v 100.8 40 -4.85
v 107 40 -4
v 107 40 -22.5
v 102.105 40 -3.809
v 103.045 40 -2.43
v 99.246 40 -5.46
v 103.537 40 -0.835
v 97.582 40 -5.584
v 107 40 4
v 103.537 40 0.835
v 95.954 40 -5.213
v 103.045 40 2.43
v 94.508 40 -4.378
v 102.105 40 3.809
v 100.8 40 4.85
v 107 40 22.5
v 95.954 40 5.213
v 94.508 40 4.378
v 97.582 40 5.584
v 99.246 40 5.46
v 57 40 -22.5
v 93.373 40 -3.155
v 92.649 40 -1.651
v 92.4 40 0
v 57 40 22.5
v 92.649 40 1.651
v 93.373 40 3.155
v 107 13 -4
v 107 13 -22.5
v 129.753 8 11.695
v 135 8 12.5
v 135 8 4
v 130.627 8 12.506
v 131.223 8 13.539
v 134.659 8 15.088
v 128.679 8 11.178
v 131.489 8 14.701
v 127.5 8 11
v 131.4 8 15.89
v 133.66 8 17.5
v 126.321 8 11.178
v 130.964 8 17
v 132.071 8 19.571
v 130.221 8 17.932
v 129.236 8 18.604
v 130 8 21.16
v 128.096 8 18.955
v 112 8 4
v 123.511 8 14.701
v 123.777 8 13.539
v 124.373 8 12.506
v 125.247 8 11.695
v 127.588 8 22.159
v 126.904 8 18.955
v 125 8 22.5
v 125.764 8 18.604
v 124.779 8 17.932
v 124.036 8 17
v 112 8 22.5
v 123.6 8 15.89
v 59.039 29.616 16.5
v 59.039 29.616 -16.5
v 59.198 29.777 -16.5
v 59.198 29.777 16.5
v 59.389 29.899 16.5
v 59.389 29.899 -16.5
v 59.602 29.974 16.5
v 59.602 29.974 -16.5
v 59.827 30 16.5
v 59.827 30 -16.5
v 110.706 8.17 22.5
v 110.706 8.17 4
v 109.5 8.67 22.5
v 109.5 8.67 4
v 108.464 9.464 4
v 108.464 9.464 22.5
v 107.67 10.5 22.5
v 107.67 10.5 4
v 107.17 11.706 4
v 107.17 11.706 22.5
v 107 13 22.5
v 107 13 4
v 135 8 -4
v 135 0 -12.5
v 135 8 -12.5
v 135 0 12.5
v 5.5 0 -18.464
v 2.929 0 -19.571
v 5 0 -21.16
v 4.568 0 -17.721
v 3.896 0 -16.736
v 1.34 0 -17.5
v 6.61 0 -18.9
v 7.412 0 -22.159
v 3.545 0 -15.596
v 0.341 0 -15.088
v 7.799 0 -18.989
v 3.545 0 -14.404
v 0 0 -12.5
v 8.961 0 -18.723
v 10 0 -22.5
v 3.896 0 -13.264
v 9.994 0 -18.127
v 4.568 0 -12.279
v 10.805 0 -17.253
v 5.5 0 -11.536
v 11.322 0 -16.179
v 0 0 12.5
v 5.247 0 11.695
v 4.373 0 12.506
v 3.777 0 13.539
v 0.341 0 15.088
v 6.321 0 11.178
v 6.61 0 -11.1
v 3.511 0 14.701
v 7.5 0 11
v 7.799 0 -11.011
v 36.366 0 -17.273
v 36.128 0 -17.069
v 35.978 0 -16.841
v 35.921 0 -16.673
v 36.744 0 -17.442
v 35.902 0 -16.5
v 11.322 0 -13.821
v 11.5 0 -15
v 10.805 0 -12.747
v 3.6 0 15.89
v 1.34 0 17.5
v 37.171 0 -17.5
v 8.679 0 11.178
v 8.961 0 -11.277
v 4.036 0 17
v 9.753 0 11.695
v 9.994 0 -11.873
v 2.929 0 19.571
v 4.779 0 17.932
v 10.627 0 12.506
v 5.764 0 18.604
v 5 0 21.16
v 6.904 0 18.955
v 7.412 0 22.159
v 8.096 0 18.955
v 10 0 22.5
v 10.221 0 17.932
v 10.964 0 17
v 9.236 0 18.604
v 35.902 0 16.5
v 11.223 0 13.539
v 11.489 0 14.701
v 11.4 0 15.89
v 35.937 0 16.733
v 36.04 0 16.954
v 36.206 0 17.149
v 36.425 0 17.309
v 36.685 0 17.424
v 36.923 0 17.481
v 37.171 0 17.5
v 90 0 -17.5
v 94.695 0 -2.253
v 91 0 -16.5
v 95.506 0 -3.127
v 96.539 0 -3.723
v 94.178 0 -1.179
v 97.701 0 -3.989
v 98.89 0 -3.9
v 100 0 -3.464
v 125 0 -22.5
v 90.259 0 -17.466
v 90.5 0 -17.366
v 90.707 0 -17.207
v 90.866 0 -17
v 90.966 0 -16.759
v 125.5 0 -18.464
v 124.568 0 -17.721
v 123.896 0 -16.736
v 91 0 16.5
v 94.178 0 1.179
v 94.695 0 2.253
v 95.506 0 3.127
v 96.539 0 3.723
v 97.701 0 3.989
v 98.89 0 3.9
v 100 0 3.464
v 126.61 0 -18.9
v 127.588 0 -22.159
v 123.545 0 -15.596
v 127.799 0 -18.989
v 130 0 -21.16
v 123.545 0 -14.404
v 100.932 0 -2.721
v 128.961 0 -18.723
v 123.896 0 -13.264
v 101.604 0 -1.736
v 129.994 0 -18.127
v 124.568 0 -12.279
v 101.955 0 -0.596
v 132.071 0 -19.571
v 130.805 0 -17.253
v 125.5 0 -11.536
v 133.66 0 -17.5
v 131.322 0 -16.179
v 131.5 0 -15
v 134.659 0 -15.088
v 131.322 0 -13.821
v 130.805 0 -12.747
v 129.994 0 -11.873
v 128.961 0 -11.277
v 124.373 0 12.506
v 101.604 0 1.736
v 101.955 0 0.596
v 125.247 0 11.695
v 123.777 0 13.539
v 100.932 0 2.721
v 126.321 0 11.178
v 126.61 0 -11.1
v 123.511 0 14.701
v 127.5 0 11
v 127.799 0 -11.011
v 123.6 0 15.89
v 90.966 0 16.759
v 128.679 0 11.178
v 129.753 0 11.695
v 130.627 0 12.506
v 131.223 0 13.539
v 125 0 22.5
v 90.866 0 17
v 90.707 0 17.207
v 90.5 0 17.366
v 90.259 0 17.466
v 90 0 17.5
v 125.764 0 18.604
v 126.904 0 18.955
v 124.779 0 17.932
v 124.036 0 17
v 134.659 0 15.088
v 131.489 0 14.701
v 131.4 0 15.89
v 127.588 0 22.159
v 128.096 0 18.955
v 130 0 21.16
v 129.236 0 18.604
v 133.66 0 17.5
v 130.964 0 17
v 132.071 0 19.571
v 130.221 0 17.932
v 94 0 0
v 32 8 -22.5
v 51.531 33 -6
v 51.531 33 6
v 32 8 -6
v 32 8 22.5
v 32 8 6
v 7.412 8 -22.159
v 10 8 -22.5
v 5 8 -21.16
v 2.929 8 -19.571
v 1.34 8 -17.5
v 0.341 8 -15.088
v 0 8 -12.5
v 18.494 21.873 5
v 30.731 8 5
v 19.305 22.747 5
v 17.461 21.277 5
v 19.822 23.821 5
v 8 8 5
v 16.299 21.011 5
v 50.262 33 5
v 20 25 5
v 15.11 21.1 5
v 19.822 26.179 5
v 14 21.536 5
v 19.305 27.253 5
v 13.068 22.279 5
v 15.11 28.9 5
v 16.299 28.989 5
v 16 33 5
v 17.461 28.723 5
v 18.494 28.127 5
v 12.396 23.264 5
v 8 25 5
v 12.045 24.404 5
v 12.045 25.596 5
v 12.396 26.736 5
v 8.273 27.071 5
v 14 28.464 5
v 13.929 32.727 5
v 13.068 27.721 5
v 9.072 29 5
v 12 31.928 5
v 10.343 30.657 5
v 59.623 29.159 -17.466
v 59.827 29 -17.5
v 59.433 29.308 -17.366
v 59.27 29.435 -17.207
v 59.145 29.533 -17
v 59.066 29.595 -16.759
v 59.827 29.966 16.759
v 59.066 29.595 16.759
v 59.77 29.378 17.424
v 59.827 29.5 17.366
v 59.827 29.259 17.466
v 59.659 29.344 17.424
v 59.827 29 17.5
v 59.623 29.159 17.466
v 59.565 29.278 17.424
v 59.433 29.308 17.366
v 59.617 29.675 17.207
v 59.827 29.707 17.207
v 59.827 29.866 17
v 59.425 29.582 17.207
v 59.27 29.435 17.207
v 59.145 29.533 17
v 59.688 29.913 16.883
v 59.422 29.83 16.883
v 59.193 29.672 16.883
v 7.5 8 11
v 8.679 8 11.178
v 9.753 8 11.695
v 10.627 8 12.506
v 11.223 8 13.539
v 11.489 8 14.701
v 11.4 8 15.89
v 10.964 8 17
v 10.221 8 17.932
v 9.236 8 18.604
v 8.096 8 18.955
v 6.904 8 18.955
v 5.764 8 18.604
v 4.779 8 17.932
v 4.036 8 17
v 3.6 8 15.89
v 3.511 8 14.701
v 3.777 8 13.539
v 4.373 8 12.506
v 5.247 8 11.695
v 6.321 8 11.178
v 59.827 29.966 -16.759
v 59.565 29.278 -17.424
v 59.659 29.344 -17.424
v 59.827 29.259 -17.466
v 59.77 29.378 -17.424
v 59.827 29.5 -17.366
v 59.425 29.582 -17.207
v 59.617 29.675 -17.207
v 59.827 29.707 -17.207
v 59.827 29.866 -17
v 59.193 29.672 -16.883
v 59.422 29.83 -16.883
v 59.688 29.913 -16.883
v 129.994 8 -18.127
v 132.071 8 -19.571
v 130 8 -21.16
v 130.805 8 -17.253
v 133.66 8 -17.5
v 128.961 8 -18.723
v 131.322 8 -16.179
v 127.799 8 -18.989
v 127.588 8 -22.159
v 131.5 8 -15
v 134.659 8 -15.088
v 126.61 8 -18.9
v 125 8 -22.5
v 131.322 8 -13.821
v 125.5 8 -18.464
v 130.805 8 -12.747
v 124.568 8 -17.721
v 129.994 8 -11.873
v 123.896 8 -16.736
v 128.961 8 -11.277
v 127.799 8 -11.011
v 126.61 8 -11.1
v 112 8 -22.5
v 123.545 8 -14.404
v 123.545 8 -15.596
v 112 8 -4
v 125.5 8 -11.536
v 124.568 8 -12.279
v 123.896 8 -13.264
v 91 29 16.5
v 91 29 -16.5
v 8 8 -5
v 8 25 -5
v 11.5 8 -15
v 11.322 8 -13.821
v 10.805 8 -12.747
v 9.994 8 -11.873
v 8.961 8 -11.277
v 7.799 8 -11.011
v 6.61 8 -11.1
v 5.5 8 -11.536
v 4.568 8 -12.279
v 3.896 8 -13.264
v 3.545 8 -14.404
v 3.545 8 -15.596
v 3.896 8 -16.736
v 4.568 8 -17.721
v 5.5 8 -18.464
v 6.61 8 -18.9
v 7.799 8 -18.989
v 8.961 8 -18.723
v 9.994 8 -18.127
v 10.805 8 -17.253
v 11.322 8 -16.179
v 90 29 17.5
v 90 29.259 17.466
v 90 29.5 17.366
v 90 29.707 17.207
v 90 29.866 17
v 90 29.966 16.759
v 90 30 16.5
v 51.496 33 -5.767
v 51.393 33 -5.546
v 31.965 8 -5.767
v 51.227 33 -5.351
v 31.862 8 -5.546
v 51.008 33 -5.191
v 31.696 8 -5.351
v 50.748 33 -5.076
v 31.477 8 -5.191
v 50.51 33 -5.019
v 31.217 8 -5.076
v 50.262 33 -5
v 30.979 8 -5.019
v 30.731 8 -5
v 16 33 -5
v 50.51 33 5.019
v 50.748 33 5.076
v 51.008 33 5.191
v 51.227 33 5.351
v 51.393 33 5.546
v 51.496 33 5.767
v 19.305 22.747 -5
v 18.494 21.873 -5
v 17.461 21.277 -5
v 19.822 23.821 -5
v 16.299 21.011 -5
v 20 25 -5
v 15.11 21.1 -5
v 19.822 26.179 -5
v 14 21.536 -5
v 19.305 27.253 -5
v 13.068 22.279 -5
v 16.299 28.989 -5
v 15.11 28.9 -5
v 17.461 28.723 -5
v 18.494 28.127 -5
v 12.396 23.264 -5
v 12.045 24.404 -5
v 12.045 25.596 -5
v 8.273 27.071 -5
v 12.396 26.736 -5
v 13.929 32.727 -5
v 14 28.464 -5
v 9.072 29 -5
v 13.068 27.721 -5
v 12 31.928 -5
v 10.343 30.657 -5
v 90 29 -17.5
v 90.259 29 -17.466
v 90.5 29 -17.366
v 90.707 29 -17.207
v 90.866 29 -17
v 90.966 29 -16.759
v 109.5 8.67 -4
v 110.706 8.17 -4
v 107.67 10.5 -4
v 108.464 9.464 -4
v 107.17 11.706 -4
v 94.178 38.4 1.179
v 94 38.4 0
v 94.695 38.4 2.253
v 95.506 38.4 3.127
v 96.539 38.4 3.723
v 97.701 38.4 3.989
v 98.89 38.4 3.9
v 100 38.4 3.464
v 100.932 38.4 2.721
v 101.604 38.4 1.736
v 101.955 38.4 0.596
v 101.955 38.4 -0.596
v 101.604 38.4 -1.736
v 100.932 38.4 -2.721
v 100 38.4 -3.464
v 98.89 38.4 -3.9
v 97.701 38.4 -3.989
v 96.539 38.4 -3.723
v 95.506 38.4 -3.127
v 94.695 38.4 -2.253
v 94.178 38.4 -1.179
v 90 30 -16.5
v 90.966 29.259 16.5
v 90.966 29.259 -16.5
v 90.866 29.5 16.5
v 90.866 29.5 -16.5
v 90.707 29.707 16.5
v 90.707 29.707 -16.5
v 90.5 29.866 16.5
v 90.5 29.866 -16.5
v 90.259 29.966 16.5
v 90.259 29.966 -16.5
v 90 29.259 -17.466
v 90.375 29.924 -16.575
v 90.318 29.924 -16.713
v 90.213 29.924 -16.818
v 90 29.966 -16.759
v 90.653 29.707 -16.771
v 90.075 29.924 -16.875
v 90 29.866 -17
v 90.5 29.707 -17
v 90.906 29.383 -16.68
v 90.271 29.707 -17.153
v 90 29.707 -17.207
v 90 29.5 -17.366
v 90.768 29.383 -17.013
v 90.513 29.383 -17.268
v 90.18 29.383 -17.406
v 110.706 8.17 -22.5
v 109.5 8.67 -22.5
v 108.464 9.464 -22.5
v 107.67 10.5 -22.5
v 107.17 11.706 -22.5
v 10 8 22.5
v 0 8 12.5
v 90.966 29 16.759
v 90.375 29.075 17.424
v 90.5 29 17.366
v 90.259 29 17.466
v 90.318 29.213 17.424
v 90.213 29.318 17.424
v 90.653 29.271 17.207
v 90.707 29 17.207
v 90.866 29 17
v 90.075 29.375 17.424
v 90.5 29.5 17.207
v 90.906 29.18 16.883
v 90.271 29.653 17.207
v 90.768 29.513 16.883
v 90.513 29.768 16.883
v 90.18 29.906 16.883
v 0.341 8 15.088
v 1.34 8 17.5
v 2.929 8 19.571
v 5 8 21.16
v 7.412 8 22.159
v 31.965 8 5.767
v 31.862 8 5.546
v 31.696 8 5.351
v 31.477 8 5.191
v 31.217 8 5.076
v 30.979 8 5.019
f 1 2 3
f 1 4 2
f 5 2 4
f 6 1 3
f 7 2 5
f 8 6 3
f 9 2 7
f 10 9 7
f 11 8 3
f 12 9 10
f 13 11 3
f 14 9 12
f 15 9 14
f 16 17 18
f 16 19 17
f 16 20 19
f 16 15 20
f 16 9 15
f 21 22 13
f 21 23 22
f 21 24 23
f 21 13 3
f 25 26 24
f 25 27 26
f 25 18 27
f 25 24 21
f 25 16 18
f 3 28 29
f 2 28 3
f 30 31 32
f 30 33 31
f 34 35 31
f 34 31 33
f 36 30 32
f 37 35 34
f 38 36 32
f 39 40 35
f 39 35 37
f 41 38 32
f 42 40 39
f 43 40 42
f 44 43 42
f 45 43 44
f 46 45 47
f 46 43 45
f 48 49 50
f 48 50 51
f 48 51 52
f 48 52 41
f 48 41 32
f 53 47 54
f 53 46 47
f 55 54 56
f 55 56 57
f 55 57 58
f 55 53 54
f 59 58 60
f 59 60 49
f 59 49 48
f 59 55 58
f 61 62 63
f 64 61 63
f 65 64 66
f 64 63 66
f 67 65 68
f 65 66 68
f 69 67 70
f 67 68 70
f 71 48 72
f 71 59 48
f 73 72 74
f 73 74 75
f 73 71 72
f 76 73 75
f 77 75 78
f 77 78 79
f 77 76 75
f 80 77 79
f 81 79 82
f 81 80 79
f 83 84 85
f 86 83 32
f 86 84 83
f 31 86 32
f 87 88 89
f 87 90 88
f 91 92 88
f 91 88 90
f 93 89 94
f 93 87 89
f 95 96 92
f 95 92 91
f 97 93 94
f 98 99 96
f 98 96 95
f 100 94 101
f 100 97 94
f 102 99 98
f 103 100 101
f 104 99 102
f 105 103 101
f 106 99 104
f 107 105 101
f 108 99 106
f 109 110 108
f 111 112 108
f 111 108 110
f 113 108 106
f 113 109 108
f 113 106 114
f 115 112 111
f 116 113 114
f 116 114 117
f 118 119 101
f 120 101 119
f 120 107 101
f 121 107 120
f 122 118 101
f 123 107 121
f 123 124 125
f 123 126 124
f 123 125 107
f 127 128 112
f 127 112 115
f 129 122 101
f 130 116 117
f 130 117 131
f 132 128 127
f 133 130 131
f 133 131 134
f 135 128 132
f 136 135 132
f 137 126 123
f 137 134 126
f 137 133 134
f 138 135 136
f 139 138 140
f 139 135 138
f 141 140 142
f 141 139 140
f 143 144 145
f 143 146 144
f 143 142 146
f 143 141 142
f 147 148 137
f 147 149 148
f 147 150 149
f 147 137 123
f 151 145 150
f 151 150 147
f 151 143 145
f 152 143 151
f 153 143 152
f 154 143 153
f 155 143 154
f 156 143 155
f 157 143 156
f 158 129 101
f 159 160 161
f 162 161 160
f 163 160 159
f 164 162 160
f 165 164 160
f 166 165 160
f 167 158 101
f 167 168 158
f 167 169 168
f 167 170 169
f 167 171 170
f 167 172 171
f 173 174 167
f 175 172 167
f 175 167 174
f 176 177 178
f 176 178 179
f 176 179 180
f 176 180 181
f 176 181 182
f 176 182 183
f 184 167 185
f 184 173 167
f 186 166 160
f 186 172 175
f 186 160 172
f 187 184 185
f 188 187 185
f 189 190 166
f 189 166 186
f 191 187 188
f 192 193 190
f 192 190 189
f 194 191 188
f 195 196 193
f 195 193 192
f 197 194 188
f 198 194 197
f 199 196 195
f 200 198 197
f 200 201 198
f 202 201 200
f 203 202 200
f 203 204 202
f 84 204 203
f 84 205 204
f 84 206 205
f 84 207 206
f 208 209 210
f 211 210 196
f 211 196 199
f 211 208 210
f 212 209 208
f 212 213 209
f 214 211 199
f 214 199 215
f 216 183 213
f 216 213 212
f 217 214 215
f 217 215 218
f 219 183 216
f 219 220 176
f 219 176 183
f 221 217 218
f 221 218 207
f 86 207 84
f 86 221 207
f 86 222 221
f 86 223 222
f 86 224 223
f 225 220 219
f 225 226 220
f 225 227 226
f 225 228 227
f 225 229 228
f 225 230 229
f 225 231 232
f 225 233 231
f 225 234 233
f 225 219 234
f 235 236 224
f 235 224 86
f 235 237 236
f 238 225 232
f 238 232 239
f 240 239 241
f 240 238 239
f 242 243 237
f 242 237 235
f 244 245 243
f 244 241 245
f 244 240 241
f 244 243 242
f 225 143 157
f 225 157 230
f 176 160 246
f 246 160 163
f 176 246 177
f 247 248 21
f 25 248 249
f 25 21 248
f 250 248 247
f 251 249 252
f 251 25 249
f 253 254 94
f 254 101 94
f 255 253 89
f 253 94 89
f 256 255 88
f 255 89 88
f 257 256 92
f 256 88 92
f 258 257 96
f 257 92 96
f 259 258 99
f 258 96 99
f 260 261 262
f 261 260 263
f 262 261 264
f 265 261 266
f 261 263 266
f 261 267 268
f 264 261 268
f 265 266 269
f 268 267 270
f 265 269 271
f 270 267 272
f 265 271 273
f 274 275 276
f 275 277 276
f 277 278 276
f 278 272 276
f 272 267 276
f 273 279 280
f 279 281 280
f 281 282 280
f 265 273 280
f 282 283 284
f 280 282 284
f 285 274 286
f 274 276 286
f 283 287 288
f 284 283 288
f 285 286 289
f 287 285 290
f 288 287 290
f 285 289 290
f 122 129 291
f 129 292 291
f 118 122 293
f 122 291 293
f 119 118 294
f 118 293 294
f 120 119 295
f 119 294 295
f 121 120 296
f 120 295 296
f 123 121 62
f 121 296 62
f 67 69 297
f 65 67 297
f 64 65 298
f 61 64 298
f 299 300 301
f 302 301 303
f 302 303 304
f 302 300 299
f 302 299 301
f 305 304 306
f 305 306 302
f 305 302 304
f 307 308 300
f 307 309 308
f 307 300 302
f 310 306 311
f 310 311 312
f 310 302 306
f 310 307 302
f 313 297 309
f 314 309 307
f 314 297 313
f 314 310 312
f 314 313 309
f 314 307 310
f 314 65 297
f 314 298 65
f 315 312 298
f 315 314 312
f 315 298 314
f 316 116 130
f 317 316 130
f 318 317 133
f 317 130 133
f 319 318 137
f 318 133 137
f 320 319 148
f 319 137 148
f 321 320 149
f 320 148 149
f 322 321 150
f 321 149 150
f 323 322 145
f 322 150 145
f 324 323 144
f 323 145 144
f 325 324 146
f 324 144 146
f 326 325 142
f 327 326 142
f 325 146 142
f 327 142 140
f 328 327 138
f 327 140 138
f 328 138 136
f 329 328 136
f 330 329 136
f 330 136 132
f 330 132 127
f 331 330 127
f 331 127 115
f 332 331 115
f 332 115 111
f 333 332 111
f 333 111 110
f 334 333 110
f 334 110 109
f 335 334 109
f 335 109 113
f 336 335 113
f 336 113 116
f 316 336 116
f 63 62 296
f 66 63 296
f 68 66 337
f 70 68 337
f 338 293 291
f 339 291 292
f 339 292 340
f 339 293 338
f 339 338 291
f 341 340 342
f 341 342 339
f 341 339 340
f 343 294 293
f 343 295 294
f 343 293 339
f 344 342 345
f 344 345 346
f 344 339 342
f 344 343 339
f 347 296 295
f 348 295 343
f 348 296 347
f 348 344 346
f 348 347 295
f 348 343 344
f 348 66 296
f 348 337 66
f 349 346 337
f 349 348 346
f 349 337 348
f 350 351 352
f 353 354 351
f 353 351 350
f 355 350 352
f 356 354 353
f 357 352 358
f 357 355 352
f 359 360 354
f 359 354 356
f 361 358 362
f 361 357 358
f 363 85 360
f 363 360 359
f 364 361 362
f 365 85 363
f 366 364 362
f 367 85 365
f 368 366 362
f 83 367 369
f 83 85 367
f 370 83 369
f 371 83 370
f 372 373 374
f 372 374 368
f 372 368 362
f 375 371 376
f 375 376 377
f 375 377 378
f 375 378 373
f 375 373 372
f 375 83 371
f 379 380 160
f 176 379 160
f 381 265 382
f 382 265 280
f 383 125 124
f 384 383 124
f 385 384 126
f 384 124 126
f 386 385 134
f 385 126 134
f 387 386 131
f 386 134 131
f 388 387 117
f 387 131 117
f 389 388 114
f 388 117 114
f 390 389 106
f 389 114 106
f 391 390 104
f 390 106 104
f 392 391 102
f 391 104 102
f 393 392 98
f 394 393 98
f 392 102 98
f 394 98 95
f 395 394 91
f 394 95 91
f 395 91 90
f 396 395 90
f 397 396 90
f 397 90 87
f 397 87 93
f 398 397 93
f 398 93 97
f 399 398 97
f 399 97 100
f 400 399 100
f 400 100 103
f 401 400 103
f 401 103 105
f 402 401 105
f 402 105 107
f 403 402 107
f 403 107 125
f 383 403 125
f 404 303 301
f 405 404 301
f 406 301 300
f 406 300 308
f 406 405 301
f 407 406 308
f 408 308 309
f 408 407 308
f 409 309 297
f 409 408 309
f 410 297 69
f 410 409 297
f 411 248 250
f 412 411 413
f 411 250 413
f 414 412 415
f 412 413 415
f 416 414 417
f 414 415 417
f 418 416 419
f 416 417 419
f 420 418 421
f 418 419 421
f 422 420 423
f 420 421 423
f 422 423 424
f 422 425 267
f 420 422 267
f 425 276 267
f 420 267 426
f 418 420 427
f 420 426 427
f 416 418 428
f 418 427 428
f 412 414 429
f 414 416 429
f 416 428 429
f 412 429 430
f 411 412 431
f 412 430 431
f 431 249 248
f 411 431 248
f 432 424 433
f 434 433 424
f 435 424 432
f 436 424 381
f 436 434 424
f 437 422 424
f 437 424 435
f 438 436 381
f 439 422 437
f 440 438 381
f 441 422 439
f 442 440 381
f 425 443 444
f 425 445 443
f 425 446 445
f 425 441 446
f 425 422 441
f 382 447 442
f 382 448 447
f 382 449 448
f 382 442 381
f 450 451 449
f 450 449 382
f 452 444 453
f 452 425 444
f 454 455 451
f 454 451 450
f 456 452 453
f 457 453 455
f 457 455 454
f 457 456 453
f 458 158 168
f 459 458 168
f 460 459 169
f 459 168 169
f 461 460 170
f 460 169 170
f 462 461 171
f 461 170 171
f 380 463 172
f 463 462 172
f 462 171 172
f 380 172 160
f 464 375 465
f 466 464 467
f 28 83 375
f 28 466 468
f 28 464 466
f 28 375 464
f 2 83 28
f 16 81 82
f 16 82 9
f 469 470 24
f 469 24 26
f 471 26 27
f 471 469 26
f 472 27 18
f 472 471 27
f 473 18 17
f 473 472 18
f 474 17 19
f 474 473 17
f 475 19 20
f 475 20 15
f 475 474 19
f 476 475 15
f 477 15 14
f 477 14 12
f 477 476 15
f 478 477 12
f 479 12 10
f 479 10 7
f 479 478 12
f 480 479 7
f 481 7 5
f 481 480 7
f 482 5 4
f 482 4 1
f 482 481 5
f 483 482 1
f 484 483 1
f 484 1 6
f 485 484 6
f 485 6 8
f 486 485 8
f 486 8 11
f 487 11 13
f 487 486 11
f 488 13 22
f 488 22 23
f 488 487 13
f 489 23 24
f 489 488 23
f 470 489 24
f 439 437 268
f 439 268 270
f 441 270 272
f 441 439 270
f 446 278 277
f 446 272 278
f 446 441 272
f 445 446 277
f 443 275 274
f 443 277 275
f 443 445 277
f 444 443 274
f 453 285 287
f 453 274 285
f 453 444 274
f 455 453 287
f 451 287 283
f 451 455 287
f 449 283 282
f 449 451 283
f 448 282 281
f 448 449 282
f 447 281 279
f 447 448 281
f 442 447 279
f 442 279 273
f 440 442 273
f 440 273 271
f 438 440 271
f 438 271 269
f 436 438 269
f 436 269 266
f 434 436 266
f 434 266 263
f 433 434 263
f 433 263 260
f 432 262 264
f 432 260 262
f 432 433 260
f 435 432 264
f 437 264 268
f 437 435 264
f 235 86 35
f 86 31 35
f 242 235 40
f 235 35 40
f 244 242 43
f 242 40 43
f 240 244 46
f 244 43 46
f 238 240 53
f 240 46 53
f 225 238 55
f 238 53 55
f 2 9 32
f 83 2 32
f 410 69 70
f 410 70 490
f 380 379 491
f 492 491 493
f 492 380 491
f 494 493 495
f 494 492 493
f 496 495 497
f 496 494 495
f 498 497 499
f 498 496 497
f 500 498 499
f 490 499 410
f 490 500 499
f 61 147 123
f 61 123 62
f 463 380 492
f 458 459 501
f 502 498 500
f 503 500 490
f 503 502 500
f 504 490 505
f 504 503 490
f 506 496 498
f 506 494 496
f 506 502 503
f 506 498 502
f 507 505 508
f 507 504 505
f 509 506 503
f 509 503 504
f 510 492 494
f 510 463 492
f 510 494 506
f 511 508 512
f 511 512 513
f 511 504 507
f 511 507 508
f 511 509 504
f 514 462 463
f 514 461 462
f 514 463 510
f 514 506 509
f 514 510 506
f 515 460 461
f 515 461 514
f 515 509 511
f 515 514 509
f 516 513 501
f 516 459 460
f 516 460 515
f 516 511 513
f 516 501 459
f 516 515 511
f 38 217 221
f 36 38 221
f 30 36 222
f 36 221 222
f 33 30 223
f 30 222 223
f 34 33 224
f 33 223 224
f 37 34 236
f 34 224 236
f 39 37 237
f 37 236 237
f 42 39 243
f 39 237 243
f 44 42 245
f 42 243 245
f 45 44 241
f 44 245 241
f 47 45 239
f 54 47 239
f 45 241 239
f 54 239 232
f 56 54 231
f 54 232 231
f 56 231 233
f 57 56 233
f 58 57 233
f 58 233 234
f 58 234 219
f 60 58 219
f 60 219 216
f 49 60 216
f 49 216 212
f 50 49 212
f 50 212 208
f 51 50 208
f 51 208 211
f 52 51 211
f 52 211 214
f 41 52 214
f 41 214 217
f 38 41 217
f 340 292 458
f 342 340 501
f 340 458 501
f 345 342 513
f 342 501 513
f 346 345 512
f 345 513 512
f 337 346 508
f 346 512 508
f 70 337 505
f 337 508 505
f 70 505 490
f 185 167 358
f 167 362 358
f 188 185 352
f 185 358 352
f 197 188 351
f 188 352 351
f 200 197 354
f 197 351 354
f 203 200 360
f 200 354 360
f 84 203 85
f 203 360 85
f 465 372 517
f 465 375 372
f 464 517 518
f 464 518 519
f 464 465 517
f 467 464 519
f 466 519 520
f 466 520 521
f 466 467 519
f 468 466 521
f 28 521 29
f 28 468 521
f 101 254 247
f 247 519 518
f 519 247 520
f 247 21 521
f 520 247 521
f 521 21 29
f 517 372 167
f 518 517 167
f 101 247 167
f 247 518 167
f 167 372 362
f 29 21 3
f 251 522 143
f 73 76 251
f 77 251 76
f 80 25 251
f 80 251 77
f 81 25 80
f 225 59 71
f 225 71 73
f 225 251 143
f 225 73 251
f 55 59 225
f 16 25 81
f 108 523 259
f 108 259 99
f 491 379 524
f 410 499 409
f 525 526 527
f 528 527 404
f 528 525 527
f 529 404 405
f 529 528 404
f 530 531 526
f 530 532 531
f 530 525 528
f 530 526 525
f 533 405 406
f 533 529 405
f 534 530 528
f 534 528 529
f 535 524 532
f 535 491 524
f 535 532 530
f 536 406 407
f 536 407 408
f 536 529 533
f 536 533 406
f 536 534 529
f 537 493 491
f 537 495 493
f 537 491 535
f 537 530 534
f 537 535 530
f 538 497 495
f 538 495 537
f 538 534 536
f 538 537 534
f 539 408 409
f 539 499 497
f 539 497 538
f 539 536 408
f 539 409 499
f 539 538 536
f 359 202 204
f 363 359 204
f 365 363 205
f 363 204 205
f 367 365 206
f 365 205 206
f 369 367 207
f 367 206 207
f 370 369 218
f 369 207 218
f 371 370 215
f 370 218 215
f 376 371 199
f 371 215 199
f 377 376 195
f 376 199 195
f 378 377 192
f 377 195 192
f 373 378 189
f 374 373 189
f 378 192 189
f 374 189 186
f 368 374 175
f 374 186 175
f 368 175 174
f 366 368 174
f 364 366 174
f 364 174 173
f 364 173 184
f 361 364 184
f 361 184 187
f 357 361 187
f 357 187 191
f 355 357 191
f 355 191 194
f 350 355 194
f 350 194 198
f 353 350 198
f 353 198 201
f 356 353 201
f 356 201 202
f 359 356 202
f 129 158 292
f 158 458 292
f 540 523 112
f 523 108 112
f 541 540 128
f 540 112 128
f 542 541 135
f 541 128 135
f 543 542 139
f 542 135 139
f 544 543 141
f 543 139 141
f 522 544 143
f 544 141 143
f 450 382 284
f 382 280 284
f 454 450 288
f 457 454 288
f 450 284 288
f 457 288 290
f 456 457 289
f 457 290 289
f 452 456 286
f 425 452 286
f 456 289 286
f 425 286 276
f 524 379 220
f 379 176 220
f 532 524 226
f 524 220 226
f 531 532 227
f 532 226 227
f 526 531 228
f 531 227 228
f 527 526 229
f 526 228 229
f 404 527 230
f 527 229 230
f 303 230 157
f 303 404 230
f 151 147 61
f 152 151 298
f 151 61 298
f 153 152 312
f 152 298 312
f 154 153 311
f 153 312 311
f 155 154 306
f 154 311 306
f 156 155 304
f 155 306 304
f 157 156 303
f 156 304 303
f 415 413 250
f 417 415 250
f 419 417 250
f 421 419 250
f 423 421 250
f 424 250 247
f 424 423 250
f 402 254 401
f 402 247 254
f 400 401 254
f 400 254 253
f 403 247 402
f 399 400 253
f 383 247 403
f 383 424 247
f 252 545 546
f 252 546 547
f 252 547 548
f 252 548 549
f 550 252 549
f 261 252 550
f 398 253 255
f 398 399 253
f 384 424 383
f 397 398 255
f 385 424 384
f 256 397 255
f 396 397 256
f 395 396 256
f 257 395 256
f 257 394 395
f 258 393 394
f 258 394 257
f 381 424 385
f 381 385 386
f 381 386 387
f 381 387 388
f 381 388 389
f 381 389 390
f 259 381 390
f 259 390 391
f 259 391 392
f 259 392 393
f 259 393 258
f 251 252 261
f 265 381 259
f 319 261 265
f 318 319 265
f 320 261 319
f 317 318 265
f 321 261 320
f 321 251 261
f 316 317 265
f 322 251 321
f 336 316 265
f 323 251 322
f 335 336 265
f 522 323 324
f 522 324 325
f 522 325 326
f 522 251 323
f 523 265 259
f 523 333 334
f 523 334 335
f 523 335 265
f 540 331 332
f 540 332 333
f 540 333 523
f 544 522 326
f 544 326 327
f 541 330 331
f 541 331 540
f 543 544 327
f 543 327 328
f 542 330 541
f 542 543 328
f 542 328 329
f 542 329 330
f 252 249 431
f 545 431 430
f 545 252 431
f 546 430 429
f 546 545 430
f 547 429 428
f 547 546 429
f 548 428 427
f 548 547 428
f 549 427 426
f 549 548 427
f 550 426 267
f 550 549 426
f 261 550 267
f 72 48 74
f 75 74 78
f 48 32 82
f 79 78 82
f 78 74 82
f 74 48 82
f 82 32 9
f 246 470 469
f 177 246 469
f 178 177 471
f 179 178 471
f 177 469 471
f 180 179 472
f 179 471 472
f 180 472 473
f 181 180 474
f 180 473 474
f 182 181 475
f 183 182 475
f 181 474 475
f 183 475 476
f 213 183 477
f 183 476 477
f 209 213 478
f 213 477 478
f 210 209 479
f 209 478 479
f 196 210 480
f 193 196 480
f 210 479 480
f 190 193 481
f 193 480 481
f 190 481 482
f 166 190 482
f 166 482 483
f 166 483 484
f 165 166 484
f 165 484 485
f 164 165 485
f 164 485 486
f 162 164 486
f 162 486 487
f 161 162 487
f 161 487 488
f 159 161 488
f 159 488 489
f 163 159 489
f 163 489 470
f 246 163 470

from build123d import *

# Parameters (mm, degrees)
EXTRUDE_1_DEPTH          = 22.5
EXTRUDE_2_DEPTH          = 5
EXTRUDE_3_DEPTH          = 4
CUT_EXTRUDE_1_DEPTH      = 23
CUT_EXTRUDE_1_DEPTH_BACK = 8
SKETCH_2_4_R             = 4
CUT_EXTRUDE_2_DEPTH      = 17.5
FILLET_1_R               = 5
SKETCH_4_R               = 4
CUT_EXTRUDE_4_DEPTH      = 35
SKETCH_5_R               = 4
CUT_EXTRUDE_5_DEPTH      = 47
FILLET_2_R               = 10
FILLET_3_R               = 1
CHAMFER_1_SIZE           = 1.6


with BuildPart() as part:
    # Эскиз1 → Бобышка-Вытянуть1 (new, symmetric)
    with BuildSketch(Plane.XY):
        Polygon((0, 0), (135, 0), (135, 8), (107, 8), (107, 40), (57, 40), (32, 8), (0, 8), align=None)
    extrude(amount=EXTRUDE_1_DEPTH, both=True)

    # Эскиз2 → Бобышка-Вытянуть2 (add, symmetric)
    with BuildSketch(Plane.XY):
        with BuildLine():
            Line((8, 8), (8, 25))
            ThreePointArc((8, 25), (10.343145751, 30.656854249), (16, 33))
            Line((16, 33), (51.53125, 33))
            Line((51.53125, 33), (32, 8))
            Line((32, 8), (8, 8))
        make_face()
    extrude(amount=EXTRUDE_2_DEPTH, both=True)

    # Эскиз2<3> → Бобышка-Вытянуть3 (add, symmetric)
    with BuildSketch(Plane.XY):
        Polygon((107, 40), (135, 8), (107, 8), align=None)
    extrude(amount=EXTRUDE_3_DEPTH, both=True)

    # Эскиз2<4> → Вырез-Вытянуть1 (cut, two sides: drawn at the far end of the back side and taken through both)
    with BuildSketch(Plane.XY.offset(-CUT_EXTRUDE_1_DEPTH_BACK)):
        with Locations((16, 25)):
            Circle(SKETCH_2_4_R)
    extrude(amount=CUT_EXTRUDE_1_DEPTH + CUT_EXTRUDE_1_DEPTH_BACK, mode=Mode.SUBTRACT)

    # Эскиз3 → Вырез-Вытянуть2 (cut, symmetric)
    with BuildSketch(Plane.XY):
        Polygon((35.901970252, 0), (59.339470252, 30), (91, 30), (91, 0), align=None)
    extrude(amount=CUT_EXTRUDE_2_DEPTH, both=True, mode=Mode.SUBTRACT)

    # Скругление1
    fillet_1_edges = [part.edges().sort_by_distance(p)[0] for p in [
        (107, 8, 13.25),
        (107, 8, -13.25),
    ]]
    fillet(fillet_1_edges, radius=FILLET_1_R)

    # Эскиз4 → Вырез-Вытянуть4 (cut)
    with BuildSketch(Plane.XZ):
        with Locations((7.5, 15)):
            Circle(SKETCH_4_R)
        with Locations((7.5, -15)):
            Circle(SKETCH_4_R)
        with Locations((127.5, -15)):
            Circle(SKETCH_4_R)
        with Locations((127.5, 15)):
            Circle(SKETCH_4_R)
    extrude(amount=-CUT_EXTRUDE_4_DEPTH, mode=Mode.SUBTRACT)

    # Эскиз5 → Вырез-Вытянуть5 (cut)
    with BuildSketch(Plane(origin=(0, 40, 0), x_dir=(1, 0, 0), z_dir=(0, 1, 0))):
        with Locations((98, 0)):
            Circle(SKETCH_5_R)
    extrude(amount=-CUT_EXTRUDE_5_DEPTH, mode=Mode.SUBTRACT)

    # Скругление2
    fillet_2_edges = [part.edges().sort_by_distance(p)[0] for p in [
        (135, 4, -22.5),
        (135, 4, 22.5),
        (0, 4, -22.5),
        (0, 4, 22.5),
    ]]
    fillet(fillet_2_edges, radius=FILLET_2_R)

    # Скругление3
    fillet_3_edges = [part.edges().sort_by_distance(p)[0] for p in [
        (41.765625, 20.5, -5),
        (41.765625, 20.5, 5),
        (91, 15, 17.5),
        (47.620720252, 15, 17.5),
        (75.169735126, 30, 17.5),
        (59.339470252, 30, 0),
        (91, 30, 0),
        (91, 15, -17.5),
        (47.620720252, 15, -17.5),
        (75.169735126, 30, -17.5),
    ]]
    fillet(fillet_3_edges, radius=FILLET_3_R)

    # Фаска1
    chamfer_1_edges = [part.edges().sort_by_distance(p)[0] for p in [
        (94, 40, 0),
    ]]
    chamfer(chamfer_1_edges, length=CHAMFER_1_SIZE)


solid = part.part
